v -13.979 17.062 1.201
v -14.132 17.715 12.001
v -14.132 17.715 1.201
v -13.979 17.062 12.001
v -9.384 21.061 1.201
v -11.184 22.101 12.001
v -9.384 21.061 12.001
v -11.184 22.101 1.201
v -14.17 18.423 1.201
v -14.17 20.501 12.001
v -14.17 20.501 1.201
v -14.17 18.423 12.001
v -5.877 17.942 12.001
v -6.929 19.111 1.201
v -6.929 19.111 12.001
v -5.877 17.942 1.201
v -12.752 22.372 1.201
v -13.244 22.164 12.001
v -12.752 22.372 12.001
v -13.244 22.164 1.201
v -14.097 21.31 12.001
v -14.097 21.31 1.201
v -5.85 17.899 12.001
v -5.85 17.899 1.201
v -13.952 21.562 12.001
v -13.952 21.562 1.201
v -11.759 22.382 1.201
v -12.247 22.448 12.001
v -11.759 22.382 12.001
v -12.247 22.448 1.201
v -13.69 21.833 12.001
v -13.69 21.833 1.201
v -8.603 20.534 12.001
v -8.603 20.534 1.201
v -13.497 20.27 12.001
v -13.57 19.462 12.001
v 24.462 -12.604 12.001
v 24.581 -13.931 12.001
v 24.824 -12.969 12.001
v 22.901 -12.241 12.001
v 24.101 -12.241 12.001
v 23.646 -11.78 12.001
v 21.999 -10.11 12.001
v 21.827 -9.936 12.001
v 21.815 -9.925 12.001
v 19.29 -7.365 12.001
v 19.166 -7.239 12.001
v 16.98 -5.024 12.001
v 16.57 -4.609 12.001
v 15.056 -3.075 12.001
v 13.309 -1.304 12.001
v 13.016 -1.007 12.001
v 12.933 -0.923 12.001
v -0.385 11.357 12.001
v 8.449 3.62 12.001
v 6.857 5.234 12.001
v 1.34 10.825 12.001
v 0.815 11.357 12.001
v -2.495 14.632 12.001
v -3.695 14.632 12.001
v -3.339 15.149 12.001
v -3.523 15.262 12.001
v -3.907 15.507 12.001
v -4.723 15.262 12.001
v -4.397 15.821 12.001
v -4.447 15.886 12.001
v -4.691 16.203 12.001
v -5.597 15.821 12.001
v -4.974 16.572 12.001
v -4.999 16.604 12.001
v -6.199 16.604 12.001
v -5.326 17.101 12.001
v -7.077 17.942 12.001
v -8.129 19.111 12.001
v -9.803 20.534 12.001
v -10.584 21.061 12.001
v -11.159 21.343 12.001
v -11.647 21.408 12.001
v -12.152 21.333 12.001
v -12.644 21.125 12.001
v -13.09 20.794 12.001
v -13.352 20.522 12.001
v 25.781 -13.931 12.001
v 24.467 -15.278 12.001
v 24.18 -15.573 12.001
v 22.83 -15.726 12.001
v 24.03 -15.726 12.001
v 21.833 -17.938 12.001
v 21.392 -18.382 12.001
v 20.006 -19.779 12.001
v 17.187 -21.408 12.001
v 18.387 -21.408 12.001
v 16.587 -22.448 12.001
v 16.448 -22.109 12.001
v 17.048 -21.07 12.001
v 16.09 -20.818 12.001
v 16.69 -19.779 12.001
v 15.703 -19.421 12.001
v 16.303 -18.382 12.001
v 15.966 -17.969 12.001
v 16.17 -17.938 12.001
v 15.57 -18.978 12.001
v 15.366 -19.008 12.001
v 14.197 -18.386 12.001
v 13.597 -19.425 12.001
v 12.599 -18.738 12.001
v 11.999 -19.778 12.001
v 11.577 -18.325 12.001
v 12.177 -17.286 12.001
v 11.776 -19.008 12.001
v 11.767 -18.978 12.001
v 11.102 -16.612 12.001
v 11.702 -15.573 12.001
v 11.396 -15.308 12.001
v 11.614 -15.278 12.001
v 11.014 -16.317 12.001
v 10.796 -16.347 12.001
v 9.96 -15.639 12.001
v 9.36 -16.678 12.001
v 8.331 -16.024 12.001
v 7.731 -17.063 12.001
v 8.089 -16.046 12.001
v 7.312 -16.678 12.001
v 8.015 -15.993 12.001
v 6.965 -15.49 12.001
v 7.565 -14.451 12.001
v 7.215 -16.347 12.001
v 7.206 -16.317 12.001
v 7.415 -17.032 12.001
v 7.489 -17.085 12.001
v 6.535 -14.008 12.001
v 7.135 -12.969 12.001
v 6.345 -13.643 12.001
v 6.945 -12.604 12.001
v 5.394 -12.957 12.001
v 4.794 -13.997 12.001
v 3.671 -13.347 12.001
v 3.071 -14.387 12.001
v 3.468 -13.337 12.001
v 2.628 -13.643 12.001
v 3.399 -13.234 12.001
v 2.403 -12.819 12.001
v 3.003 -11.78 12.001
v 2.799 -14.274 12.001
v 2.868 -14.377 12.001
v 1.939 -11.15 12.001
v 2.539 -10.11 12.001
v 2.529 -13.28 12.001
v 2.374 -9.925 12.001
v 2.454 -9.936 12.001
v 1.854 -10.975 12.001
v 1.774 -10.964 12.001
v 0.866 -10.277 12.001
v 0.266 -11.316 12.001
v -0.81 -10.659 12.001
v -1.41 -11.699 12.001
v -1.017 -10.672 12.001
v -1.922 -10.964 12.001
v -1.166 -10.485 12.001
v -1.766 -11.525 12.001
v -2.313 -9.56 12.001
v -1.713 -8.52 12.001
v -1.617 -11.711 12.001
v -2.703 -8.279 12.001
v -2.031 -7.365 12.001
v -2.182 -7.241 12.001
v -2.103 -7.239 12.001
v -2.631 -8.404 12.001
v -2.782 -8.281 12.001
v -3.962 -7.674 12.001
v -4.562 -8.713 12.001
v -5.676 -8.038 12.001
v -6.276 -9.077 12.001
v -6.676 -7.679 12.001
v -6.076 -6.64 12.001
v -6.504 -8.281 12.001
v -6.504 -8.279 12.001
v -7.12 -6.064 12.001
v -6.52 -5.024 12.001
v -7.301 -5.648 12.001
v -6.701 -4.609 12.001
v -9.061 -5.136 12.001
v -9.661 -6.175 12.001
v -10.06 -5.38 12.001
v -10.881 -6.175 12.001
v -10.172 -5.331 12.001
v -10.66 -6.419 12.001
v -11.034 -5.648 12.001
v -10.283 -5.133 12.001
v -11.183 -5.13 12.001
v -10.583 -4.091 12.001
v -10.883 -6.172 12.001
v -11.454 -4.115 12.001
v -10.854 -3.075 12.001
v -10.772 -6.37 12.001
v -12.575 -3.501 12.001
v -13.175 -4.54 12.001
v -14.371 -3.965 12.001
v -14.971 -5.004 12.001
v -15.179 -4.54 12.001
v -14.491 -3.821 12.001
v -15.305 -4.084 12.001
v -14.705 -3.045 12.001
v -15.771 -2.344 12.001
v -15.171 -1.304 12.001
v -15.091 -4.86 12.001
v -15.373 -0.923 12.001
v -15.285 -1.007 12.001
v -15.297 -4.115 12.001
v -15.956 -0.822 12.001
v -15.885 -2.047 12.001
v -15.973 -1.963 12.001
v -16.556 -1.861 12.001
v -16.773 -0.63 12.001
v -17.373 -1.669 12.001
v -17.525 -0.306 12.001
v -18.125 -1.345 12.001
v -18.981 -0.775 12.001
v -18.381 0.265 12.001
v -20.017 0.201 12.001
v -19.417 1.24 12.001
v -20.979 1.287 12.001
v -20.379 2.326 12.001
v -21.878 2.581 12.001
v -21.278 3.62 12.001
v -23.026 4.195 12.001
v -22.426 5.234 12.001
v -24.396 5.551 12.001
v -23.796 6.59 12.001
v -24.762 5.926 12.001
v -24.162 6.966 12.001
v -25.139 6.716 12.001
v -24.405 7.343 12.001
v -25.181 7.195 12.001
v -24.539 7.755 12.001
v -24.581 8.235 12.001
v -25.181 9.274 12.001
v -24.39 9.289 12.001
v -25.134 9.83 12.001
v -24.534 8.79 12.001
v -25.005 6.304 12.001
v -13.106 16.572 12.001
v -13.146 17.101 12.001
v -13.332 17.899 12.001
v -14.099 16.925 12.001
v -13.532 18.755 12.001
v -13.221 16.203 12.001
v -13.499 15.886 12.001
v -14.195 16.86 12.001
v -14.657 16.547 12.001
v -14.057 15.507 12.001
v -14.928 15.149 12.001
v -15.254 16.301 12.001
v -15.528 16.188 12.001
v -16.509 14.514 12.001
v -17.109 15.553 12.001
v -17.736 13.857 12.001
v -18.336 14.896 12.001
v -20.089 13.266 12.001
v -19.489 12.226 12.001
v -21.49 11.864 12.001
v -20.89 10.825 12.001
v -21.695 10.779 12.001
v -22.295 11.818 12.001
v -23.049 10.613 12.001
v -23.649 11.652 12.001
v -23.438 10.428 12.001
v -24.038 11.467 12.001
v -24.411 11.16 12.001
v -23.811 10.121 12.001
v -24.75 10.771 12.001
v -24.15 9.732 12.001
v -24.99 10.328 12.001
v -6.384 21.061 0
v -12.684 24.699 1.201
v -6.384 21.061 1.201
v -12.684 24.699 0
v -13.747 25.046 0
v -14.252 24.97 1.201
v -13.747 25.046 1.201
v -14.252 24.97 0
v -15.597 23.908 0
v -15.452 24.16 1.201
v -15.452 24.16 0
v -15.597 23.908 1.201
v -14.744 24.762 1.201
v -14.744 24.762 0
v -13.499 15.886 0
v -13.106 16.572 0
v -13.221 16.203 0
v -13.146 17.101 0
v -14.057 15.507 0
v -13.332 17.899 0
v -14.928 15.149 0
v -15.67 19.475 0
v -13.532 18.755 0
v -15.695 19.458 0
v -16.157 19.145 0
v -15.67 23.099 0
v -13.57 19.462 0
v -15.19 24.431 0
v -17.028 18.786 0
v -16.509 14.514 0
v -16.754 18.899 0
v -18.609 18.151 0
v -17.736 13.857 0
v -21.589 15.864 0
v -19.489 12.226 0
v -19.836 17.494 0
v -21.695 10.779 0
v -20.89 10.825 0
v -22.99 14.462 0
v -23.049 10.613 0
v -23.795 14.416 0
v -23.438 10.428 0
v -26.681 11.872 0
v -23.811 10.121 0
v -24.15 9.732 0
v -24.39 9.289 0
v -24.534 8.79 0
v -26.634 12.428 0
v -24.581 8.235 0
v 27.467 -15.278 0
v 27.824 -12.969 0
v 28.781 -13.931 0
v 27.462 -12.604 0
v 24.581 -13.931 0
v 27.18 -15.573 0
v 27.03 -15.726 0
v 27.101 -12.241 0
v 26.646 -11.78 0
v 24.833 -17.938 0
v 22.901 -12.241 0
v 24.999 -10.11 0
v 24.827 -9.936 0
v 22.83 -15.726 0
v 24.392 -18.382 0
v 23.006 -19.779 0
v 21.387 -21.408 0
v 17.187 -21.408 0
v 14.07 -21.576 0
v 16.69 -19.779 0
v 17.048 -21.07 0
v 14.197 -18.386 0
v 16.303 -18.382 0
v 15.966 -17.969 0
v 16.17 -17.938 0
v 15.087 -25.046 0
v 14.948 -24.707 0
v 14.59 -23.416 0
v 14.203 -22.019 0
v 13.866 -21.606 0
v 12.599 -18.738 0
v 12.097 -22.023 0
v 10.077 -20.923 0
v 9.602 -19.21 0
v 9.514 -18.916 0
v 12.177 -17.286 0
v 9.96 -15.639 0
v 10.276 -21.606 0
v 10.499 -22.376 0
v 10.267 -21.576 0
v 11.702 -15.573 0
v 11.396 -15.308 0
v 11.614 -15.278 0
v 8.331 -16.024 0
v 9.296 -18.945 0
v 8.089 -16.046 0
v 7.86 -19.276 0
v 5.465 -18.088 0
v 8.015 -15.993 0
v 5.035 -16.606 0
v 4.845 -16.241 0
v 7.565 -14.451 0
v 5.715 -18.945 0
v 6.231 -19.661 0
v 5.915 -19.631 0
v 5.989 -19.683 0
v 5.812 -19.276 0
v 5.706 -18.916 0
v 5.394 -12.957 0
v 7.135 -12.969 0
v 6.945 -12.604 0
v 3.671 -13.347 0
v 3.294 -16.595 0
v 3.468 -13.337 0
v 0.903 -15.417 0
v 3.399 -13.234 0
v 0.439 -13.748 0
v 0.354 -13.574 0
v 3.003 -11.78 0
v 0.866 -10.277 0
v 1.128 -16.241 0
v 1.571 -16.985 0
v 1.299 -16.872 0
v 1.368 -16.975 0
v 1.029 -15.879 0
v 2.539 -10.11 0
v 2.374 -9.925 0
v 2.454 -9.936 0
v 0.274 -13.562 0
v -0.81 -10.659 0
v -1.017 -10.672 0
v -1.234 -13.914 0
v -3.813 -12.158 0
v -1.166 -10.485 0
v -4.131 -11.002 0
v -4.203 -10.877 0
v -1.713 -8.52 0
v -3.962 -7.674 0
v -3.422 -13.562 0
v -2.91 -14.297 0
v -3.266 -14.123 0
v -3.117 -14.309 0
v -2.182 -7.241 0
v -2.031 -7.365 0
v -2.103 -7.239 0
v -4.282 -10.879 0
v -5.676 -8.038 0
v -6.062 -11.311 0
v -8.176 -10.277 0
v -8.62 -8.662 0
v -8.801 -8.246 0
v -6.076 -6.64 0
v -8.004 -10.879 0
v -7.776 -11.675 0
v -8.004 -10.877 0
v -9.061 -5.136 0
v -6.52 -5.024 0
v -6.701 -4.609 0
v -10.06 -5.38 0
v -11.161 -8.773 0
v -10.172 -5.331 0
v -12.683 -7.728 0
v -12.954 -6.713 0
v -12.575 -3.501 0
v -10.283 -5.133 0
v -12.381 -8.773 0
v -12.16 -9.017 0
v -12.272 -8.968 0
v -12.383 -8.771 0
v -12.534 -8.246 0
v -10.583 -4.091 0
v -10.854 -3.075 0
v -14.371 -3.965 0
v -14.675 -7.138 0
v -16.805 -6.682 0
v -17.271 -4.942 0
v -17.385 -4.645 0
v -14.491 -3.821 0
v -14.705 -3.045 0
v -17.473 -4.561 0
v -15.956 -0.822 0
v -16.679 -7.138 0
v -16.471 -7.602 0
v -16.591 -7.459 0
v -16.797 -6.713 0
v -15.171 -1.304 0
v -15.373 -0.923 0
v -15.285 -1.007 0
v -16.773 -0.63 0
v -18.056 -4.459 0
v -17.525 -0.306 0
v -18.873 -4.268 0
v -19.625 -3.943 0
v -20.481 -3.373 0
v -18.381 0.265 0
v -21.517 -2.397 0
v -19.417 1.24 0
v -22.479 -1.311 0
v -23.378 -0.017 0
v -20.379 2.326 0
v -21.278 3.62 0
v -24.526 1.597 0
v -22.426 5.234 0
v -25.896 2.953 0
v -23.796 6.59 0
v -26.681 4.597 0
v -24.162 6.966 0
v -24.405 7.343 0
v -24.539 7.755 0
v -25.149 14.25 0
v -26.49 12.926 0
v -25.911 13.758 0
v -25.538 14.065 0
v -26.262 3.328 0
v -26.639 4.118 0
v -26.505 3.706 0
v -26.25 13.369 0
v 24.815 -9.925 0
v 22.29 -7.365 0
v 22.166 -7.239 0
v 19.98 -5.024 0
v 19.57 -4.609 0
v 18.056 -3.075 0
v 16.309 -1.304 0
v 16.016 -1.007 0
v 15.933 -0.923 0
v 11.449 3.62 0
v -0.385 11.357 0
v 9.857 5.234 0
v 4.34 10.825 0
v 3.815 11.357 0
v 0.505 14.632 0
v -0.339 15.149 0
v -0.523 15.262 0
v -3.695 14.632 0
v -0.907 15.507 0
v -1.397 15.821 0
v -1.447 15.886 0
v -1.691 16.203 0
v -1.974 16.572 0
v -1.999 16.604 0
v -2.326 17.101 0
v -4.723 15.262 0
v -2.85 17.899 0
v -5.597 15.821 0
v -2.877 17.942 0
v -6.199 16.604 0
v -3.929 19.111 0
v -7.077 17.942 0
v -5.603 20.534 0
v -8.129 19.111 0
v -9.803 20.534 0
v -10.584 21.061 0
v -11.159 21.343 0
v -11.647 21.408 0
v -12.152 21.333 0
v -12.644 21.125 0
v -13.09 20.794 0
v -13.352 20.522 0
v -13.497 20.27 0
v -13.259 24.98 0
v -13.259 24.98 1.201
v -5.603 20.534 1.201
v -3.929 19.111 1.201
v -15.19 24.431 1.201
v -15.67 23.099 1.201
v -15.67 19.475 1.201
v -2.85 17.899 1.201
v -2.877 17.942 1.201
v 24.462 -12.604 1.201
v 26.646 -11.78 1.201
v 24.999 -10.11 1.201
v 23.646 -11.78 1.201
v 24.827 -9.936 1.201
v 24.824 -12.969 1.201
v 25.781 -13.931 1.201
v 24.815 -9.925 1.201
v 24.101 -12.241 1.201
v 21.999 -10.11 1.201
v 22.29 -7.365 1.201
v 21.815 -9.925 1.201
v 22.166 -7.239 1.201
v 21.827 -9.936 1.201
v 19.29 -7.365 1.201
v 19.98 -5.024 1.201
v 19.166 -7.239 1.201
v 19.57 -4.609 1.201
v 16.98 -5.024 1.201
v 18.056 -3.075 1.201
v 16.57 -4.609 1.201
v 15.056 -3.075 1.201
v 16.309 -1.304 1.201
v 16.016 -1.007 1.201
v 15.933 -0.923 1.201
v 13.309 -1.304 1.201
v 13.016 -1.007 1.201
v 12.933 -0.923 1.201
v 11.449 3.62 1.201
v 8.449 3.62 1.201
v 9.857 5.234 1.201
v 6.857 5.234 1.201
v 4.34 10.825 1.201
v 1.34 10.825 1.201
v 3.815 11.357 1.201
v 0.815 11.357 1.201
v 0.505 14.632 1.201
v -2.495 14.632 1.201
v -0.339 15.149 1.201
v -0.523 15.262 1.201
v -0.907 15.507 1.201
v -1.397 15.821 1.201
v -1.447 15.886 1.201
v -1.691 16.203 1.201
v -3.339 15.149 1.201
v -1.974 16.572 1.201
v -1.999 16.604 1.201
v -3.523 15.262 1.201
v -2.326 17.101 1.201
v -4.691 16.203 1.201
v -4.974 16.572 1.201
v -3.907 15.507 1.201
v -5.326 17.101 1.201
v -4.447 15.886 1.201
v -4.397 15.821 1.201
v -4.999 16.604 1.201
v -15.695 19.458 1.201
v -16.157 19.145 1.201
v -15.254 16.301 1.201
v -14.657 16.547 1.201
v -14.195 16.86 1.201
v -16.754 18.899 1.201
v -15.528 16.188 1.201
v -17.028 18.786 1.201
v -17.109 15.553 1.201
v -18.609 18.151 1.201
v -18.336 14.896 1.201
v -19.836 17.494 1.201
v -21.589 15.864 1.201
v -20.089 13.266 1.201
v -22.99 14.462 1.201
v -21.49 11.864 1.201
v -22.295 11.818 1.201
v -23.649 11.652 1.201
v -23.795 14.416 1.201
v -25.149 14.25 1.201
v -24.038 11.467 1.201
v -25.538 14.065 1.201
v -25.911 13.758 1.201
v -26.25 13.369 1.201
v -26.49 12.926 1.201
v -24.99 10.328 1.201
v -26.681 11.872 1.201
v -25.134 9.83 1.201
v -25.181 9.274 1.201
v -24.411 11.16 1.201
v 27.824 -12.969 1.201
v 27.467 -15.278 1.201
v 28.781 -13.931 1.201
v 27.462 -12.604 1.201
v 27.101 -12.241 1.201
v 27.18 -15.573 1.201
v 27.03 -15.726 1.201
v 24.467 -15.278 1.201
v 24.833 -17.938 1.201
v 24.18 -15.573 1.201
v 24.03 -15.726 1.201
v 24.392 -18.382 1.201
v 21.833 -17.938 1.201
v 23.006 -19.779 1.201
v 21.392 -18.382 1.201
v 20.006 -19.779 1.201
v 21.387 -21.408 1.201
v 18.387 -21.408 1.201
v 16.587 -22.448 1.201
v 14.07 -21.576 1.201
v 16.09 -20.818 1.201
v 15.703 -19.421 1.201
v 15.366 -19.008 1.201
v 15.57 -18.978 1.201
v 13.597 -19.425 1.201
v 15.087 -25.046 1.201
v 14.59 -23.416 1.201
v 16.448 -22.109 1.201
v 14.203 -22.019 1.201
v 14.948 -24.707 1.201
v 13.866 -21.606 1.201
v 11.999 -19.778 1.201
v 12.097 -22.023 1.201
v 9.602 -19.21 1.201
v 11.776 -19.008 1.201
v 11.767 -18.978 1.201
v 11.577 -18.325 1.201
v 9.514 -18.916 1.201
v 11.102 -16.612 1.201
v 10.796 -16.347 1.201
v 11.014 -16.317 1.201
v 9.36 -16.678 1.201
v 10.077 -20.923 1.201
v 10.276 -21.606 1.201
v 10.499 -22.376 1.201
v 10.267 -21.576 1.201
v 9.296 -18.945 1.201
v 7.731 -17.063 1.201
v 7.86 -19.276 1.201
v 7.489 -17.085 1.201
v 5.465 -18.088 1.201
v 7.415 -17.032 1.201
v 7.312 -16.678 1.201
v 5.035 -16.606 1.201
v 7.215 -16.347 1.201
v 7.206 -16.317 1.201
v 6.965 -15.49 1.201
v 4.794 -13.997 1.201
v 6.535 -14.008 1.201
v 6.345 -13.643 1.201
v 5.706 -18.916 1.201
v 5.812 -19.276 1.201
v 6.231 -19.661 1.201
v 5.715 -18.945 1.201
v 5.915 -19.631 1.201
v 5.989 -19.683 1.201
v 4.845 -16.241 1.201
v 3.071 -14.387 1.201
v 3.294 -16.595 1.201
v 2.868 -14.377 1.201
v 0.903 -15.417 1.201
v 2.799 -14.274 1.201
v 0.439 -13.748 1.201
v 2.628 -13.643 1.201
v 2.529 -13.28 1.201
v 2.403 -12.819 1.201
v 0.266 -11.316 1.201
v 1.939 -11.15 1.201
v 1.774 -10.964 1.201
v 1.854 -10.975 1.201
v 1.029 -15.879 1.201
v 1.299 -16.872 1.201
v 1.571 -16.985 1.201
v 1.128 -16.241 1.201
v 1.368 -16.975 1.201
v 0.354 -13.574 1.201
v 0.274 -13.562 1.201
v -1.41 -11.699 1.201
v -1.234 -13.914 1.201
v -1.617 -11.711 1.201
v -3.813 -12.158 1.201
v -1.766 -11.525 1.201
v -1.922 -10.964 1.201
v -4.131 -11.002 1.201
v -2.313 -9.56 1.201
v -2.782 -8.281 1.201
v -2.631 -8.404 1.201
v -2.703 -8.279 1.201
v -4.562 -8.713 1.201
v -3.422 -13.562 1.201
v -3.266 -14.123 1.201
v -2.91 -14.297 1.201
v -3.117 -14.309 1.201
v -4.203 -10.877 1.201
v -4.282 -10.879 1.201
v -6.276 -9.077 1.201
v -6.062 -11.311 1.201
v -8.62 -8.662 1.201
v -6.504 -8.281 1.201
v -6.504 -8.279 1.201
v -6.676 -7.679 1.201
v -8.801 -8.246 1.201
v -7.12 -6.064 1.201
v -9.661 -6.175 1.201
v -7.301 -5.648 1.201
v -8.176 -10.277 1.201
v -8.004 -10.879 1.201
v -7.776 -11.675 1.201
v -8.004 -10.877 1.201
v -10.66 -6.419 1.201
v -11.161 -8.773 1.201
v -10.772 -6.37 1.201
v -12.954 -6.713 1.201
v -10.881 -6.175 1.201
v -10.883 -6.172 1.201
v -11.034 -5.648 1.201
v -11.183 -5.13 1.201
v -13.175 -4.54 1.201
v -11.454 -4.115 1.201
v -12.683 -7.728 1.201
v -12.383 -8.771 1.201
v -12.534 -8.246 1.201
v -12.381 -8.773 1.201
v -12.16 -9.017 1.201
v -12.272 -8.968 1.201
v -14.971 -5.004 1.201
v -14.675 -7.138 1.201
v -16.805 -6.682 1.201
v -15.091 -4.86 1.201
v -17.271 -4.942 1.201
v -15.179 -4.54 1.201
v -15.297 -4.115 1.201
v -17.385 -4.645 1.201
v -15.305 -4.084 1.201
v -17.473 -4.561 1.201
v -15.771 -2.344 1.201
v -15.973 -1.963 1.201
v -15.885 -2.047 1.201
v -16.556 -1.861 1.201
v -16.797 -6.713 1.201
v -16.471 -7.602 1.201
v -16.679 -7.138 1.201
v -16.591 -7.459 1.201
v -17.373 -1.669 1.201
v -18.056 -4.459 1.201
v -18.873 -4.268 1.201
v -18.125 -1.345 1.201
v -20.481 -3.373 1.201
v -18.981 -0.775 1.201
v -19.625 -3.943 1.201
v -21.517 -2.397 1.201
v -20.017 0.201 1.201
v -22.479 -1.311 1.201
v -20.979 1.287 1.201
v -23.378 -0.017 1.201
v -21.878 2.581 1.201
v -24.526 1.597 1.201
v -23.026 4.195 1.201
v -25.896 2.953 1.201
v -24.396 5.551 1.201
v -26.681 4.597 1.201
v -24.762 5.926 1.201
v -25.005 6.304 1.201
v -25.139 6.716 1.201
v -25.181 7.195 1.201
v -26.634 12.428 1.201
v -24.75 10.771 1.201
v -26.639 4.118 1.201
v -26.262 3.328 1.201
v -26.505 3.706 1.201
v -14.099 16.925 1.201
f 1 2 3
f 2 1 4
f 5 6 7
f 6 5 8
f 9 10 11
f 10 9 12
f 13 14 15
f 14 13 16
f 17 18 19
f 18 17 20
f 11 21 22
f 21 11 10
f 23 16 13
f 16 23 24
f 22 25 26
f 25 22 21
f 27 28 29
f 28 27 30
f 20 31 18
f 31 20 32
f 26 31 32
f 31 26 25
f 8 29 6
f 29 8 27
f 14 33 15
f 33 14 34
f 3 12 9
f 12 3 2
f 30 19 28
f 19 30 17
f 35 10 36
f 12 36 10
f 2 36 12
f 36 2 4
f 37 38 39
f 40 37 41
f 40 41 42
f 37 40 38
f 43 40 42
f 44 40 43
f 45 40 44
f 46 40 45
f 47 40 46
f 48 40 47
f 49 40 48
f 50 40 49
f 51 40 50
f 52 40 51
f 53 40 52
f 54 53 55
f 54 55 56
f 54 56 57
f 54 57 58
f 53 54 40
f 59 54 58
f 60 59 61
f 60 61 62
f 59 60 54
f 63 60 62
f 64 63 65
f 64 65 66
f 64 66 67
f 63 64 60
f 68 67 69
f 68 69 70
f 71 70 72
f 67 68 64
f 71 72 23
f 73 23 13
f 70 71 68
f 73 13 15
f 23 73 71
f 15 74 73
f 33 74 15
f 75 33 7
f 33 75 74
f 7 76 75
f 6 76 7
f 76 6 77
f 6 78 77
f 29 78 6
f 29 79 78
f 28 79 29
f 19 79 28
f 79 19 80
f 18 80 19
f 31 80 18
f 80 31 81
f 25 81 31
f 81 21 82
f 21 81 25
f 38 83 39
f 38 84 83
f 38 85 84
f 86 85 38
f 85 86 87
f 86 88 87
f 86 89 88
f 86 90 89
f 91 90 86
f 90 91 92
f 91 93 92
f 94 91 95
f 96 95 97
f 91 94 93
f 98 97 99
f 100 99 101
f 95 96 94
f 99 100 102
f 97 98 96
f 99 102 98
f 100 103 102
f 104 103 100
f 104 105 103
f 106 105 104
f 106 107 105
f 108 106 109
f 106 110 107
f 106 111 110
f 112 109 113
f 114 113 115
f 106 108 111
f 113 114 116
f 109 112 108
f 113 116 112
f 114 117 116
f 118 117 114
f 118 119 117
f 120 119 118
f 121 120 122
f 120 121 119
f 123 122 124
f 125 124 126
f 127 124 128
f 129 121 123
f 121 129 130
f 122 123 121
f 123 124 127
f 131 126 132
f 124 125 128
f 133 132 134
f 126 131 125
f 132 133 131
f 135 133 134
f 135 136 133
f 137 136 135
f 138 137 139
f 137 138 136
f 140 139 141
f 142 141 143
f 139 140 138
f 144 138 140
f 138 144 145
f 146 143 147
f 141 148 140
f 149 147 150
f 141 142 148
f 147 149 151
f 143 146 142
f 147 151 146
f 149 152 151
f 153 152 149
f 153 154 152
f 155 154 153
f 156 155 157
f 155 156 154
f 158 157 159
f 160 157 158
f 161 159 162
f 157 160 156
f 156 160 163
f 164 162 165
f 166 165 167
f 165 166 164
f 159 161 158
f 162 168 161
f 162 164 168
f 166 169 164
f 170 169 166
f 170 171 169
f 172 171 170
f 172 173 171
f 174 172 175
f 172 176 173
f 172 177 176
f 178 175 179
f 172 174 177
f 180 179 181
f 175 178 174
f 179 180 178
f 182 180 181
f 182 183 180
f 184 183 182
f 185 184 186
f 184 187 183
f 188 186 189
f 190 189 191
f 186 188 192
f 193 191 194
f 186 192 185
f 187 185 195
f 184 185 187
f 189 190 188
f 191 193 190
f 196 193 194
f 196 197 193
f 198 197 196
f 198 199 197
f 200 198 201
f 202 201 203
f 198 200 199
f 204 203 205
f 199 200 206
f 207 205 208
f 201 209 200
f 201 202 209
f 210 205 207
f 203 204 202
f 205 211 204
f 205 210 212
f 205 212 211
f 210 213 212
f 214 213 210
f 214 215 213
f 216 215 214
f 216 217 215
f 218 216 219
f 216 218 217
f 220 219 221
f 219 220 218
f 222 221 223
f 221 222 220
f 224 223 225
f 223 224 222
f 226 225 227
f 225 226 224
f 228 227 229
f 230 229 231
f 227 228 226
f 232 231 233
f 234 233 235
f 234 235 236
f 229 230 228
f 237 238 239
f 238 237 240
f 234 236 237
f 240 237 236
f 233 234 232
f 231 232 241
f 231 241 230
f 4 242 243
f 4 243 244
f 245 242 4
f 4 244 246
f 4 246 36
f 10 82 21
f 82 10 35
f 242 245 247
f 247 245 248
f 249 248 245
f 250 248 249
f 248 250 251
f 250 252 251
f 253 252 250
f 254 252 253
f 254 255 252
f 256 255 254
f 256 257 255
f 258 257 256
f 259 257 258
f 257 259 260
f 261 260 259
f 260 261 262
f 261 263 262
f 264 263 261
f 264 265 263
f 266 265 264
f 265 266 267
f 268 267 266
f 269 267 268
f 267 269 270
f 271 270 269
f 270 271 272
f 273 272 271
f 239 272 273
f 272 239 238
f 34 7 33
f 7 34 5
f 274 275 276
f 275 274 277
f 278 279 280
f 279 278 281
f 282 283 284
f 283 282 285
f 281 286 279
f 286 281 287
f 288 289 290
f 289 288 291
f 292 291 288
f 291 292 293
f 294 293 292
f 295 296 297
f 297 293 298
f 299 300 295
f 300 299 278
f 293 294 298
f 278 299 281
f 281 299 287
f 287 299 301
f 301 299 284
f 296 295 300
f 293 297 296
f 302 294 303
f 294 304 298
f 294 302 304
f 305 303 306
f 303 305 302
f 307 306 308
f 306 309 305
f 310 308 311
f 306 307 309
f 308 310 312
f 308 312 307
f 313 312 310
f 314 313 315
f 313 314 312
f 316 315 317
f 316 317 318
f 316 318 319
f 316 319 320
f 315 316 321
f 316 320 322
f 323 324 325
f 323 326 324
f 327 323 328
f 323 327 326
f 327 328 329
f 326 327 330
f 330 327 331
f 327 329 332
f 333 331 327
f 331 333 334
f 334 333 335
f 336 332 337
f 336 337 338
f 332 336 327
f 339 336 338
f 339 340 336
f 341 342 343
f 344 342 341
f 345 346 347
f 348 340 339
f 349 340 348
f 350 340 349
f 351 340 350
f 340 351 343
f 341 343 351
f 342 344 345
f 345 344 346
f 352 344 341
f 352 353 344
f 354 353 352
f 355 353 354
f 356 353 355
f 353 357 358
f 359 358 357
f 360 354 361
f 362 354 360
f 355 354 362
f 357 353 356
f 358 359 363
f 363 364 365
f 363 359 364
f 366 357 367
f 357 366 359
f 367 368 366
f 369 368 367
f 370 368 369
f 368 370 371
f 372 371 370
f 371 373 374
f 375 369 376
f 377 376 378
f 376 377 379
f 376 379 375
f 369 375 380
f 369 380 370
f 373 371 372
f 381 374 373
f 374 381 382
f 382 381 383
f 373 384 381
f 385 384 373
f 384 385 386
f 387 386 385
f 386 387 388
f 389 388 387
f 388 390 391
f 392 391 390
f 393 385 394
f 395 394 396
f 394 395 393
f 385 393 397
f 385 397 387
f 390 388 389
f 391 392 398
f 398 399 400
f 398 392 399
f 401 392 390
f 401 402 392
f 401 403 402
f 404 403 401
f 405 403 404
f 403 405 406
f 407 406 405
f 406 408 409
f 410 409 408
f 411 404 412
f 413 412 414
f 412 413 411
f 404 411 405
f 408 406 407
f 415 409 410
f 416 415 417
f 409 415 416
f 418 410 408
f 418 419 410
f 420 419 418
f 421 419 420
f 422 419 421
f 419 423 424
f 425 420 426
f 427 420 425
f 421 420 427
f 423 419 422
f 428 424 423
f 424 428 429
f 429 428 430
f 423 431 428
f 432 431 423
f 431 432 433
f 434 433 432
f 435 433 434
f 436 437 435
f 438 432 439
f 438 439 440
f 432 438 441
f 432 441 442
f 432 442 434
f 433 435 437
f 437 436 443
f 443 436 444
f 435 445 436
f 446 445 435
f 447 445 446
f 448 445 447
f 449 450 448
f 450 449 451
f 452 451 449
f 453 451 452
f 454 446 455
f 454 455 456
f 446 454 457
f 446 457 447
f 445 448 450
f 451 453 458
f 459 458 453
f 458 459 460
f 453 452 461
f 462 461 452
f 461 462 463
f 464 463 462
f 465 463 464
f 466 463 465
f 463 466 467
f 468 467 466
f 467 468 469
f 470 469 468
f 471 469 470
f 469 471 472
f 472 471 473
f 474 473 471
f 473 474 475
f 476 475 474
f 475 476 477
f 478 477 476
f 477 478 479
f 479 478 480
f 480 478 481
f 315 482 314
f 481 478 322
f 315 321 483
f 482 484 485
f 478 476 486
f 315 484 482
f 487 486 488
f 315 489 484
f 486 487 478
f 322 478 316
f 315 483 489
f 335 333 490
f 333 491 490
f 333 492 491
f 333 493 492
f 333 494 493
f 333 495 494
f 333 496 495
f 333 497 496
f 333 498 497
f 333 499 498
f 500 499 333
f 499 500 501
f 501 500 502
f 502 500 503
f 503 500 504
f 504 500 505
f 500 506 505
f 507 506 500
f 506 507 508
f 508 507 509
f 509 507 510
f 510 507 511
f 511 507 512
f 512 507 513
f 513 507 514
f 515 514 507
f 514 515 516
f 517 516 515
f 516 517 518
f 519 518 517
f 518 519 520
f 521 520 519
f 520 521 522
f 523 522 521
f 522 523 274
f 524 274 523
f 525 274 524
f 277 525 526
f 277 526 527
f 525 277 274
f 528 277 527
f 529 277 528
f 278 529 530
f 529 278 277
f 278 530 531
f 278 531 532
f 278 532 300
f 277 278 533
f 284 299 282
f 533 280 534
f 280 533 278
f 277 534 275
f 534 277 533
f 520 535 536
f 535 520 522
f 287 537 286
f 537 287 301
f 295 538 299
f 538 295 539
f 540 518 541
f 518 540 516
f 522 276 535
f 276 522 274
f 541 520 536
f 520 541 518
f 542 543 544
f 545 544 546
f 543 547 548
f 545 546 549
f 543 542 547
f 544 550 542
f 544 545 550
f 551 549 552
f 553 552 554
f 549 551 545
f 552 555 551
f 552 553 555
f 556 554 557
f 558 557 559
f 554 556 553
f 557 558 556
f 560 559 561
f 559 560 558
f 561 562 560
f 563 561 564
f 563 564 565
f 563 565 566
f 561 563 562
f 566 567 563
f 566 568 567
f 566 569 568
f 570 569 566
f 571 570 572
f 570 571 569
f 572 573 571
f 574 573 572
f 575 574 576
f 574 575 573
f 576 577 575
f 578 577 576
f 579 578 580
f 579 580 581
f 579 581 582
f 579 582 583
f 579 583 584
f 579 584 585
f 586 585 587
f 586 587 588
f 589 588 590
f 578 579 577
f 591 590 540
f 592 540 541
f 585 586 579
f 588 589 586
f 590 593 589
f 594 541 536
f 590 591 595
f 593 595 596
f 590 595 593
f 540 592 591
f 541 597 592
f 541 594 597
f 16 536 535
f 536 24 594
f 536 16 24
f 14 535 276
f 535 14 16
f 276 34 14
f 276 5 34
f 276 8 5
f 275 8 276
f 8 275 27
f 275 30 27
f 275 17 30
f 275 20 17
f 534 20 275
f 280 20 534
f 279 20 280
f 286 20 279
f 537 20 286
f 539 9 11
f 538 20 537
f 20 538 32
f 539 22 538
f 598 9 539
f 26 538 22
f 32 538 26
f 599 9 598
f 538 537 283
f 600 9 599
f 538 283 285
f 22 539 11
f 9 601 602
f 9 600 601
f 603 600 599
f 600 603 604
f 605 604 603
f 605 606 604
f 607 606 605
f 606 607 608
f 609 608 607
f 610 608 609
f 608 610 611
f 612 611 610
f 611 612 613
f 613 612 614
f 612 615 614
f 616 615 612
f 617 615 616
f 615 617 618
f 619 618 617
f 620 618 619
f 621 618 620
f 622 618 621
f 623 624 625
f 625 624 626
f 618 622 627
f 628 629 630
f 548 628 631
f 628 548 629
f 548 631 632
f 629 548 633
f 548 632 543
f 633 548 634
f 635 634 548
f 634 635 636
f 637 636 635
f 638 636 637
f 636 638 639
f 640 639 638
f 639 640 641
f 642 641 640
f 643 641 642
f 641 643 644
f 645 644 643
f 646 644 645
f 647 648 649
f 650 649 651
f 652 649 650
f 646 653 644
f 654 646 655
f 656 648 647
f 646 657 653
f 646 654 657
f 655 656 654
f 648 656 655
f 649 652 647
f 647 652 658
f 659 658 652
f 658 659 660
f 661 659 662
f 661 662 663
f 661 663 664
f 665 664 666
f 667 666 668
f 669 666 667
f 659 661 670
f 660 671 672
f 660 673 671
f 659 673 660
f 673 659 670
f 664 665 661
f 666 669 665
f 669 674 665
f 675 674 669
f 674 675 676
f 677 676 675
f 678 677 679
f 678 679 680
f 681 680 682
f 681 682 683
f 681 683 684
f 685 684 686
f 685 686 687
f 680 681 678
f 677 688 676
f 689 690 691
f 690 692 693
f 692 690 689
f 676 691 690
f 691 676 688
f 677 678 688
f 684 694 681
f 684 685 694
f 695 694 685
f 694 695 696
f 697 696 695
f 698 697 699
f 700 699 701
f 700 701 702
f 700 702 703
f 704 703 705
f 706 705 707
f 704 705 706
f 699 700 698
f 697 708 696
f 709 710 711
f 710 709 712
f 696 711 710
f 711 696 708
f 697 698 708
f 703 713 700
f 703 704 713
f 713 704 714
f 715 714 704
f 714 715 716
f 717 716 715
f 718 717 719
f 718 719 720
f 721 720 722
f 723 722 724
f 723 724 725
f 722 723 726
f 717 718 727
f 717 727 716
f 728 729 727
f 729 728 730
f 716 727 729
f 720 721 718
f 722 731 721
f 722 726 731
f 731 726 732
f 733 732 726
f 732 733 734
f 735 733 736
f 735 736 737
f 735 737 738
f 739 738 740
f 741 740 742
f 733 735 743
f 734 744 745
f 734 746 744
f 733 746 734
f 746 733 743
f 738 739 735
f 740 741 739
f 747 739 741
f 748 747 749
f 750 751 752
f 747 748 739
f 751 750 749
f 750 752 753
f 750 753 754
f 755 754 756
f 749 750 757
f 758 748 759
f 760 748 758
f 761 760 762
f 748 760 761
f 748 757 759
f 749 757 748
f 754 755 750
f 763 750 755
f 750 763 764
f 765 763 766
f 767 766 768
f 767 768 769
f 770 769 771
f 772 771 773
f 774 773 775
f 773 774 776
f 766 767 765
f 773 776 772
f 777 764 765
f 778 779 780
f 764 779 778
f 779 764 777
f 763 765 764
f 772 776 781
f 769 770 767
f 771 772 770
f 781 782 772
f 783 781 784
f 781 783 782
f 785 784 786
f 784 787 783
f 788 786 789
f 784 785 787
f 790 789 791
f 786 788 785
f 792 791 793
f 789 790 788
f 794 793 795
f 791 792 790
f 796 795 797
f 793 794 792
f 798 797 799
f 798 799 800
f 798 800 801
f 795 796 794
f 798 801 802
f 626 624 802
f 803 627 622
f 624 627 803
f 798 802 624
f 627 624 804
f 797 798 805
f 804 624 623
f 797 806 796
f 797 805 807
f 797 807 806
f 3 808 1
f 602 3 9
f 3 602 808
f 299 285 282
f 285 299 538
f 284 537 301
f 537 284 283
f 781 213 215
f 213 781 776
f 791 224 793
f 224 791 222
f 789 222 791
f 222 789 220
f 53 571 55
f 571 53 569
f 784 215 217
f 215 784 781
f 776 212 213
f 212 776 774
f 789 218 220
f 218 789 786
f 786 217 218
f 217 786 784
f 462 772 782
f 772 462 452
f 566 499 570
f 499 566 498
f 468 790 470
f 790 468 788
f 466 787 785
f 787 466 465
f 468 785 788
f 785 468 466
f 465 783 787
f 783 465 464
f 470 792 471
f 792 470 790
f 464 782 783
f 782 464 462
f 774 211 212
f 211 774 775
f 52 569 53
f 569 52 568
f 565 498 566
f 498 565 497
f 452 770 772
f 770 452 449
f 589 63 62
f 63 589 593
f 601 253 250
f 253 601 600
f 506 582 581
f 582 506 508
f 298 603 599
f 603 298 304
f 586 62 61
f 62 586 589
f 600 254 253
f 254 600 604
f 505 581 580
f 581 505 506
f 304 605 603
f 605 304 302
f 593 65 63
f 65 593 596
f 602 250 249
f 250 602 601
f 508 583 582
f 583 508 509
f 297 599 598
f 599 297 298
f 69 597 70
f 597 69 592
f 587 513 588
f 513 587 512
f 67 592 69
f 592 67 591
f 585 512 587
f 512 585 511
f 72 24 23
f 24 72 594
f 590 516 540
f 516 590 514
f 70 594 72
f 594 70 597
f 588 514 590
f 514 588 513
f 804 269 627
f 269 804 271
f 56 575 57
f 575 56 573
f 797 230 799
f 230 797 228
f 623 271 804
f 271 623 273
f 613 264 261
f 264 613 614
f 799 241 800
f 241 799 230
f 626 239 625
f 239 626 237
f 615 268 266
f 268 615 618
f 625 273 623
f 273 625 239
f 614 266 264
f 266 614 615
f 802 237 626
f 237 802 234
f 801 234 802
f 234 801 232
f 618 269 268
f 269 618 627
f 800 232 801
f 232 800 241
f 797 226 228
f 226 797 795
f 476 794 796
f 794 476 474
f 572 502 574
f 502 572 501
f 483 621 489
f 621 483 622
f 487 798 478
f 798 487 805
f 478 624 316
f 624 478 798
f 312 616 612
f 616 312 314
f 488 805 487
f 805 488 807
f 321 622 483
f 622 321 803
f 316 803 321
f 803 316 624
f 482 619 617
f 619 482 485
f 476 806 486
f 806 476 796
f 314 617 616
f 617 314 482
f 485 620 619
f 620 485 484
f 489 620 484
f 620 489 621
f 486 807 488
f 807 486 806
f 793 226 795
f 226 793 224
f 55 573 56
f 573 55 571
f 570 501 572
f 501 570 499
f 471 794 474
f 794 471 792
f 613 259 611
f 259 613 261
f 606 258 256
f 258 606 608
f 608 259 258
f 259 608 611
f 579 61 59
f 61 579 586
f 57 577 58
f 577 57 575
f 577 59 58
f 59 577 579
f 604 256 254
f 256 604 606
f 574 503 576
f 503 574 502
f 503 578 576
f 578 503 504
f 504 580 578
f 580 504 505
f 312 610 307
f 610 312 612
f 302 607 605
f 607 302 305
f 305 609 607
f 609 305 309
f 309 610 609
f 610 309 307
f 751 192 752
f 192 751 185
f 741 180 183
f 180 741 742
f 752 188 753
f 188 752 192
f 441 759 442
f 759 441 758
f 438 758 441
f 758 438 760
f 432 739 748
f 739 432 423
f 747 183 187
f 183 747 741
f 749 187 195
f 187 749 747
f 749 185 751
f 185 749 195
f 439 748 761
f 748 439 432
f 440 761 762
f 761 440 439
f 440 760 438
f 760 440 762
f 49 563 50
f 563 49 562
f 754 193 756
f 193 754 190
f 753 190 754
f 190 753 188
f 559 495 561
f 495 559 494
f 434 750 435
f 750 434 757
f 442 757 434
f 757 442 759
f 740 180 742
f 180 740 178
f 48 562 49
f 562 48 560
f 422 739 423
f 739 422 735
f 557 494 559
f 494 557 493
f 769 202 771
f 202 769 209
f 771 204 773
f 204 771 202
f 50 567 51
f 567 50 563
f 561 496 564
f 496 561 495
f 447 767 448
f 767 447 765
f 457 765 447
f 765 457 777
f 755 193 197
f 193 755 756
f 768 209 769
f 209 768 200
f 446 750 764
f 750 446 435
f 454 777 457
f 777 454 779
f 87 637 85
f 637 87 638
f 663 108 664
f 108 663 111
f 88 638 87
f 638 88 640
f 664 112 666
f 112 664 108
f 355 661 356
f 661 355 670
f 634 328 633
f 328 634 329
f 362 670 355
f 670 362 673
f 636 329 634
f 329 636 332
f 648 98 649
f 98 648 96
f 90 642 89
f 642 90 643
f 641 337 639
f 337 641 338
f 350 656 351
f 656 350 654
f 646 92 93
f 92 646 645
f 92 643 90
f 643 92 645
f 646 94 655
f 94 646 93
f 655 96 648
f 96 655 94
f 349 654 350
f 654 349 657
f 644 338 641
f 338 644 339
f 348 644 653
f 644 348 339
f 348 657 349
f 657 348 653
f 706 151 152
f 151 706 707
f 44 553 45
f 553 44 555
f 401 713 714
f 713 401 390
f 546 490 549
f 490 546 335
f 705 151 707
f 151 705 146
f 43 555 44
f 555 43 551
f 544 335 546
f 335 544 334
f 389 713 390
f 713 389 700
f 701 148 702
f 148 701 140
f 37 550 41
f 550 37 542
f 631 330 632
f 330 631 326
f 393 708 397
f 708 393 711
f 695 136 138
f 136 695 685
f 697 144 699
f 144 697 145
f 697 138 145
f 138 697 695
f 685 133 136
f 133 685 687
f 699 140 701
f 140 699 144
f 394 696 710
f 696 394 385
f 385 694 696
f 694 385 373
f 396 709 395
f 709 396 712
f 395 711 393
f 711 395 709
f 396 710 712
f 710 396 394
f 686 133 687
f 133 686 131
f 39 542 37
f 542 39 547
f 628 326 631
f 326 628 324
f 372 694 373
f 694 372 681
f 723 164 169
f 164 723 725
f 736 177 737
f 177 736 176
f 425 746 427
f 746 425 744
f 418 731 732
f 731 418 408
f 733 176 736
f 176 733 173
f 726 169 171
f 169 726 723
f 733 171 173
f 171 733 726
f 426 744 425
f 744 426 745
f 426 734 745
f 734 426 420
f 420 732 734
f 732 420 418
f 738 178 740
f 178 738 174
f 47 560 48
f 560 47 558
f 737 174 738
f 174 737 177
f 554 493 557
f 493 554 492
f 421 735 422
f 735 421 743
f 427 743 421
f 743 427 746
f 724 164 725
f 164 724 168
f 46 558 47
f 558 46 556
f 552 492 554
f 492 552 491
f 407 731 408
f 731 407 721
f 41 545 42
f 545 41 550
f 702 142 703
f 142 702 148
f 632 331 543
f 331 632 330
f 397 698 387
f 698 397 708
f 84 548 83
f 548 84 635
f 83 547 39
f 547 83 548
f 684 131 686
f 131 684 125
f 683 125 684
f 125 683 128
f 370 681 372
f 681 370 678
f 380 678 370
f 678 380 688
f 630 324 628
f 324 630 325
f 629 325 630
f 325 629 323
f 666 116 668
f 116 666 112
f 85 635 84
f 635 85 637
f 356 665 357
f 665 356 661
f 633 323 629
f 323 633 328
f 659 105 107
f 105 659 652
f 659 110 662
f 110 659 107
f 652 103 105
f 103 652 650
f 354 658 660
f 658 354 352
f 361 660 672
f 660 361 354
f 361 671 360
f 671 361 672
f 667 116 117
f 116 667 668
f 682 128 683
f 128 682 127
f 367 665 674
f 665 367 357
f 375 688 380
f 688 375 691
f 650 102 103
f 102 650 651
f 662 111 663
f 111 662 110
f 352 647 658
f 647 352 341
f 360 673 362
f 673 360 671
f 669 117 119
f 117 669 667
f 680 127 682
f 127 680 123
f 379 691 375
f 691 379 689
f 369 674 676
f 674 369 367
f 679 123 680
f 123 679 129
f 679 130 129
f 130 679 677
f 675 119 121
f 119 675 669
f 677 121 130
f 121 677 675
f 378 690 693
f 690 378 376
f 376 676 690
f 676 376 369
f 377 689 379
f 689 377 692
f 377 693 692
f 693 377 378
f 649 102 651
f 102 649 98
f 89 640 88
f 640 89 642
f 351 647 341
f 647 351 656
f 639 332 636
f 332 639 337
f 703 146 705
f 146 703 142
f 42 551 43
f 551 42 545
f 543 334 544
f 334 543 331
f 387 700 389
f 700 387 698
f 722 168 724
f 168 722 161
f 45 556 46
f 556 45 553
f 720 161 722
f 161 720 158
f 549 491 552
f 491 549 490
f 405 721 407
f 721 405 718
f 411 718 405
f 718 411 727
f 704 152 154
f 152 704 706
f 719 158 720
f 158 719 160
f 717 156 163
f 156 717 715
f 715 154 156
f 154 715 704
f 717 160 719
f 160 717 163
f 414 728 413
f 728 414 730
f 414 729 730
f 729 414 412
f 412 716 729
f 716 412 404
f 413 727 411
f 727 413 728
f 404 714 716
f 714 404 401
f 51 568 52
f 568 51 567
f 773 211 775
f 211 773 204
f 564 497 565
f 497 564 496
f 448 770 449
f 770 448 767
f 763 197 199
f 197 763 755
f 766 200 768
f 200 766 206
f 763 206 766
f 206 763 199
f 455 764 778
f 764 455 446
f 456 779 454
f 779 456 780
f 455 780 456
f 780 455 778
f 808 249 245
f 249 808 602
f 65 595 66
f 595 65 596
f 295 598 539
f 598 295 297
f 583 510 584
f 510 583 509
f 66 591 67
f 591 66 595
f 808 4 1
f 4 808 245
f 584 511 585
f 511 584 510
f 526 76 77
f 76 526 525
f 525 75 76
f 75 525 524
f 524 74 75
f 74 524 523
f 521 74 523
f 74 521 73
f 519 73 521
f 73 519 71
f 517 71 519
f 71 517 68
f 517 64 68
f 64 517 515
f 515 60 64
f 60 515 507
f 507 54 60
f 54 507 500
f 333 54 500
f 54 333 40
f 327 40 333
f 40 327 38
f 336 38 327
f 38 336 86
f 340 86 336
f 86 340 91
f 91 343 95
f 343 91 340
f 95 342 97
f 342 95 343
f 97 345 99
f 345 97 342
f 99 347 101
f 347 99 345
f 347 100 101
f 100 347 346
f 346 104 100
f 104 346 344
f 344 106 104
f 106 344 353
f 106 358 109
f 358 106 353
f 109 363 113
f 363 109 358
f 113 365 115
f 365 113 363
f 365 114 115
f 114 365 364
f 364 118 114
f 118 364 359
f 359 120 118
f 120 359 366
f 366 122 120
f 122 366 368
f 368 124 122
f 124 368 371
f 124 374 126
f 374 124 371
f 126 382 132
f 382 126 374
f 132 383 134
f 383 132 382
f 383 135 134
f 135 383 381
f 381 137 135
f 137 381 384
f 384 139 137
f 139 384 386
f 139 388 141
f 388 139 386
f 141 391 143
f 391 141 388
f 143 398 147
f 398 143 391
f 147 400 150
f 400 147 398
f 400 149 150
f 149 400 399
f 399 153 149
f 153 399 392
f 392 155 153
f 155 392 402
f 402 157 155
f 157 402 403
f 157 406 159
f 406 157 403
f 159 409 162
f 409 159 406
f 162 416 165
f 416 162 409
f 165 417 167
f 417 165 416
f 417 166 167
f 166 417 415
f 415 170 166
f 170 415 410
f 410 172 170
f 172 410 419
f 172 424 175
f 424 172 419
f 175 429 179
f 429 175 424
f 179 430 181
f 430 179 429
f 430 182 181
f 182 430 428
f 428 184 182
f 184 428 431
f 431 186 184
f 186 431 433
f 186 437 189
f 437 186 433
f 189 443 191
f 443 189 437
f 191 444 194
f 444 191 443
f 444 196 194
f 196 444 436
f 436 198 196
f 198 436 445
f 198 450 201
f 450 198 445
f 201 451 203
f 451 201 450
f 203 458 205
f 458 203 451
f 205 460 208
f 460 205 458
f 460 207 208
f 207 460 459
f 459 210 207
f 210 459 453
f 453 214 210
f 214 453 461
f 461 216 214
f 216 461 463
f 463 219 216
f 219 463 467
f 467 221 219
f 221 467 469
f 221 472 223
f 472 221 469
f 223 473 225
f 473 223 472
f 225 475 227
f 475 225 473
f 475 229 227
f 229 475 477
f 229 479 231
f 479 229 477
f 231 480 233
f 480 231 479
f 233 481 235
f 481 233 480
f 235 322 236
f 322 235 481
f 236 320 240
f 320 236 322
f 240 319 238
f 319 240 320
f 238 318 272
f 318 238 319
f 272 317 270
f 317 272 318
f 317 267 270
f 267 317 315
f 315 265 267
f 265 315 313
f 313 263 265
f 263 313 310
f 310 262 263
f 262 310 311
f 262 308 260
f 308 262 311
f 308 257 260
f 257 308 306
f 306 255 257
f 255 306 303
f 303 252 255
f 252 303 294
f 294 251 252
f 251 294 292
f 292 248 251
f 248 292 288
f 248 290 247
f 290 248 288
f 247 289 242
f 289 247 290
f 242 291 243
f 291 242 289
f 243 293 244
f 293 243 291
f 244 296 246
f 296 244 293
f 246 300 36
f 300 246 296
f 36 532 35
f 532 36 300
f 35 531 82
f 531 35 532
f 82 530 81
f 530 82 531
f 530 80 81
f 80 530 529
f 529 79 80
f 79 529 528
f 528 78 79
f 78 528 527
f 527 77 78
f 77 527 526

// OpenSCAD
// Module names are of the form poly_<inkscape-path-id>().  As a result,
// you can associate a polygon in this OpenSCAD program with the corresponding
// SVG element in the Inkscape document by looking for the XML element with
// the attribute id="inkscape-path-id".

// fudge value is used to ensure that subtracted solids are a tad taller
// in the z dimension than the polygon being subtracted from.  This helps
// keep the resulting .stl file manifold.
fudge = 0.1;

			
			    /// Global parameters
grid = false ;   //Use grid for multi elements cutters
full= false ;  //For build full or empty objects (see instuctables for details)
borderThick = 1.20000004768  ;    //border thickness (mm)
h=   12.0  ;    //total height of the cookie cutter (mm)
borderType=  1   ;    //type of border, 0 none, 1-classic, 2-cone
Lreb = 3.0;     //Width of border (en mm)
Hreb = 1.20000004768 ;    //Thickness of border (mm)




                /// Grid parameters
gridX=300;      //Maximum X dimension Change only if you build cookies bigger than 30cm
gridY=300;      //Maximum Y dimension Change only if you build cookies bigger than 30cm
meshSolid=1.20000004768;    //width of solid part of grid
meshSpace=8.0;    //width of blank part of grid 
gridThickness=Hreb; //thickness of grid
moveGridX=0;    //X shift for adujustments
moveGridY=0;    //Y shift for adjustments
rotateGridZ=45.0;  //Z rotation for adjtments
$fn = 0.1;



module poly_path172(h)
{
  scale([25.4/90, -25.4/90, 1]) union()
  {
    linear_extrude(height=h)
      polygon([[60.407721,74.657168],[59.139561,70.081678],[57.765511,65.133328],[57.295591,63.561078],[56.573141,63.669988],[50.305531,65.146208],[44.642671,66.395828],[43.148421,61.250038],[41.462732,55.178668],[41.153591,54.135388],[40.380061,54.241408],[35.290382,55.414018],[29.520545,56.776828],[28.661447,56.855256],[28.399231,56.668948],[26.805301,51.204038],[25.281140,45.952056],[24.609421,44.659848],[19.114011,45.911998],[13.007591,47.293668],[12.286869,47.258843],[12.044781,46.893268],[10.641861,41.740288],[8.995434,35.823836],[8.696067,35.207110],[8.411591,35.165798],[3.068581,36.414948],[-2.869745,37.769718],[-3.603739,37.813011],[-4.133076,37.153153],[-6.069555,30.190508],[-7.194732,26.096932],[-7.451932,25.651630],[-7.731295,25.658248],[-14.039279,27.190288],[-20.112964,28.479788],[-21.528077,23.527168],[-23.101191,17.803218],[-23.744516,16.331498],[-32.105345,18.198318],[-35.645268,19.062088],[-36.041638,18.887897],[-36.434084,18.188738],[-37.499641,14.495298],[-38.457464,10.896708],[-44.558765,12.404028],[-50.921996,14.048038],[-51.344832,13.539905],[-52.105399,10.789998],[-53.754338,4.622181],[-54.158391,3.569183],[-54.470473,3.271508],[-56.537578,2.910968],[-59.433213,2.233142],[-62.095300,1.083348],[-65.128738,-0.937333],[-68.801259,-4.393582],[-72.208963,-8.241574],[-75.393824,-12.827822],[-79.463523,-18.546040],[-84.315973,-23.350842],[-85.613833,-24.681516],[-86.473126,-26.018745],[-86.949342,-27.478755],[-87.097971,-29.177772],[-86.931493,-31.146903],[-86.422799,-32.913070],[-85.569253,-34.482758],[-84.368221,-35.862452],[-83.049004,-36.949127],[-81.669920,-37.603503],[-76.872602,-38.193702],[-74.019215,-38.354892],[-69.054288,-43.322022],[-62.845537,-49.097912],[-58.495942,-51.426277],[-52.894953,-53.677993],[-49.809612,-54.947373],[-47.832074,-56.287793],[-46.844757,-57.410928],[-46.437945,-58.719235],[-46.579776,-60.595648],[-47.238389,-63.423103],[-47.948633,-66.453235],[-48.082411,-68.959943],[-47.824865,-71.823933],[-47.309868,-72.717150],[-46.383316,-73.679113],[-44.801351,-74.851477],[-43.058668,-75.587971],[-41.267851,-75.856568],[-39.541483,-75.625243],[-37.501701,-74.627051],[-34.736631,-72.758489],[-28.803551,-67.716113],[-25.077316,-63.572279],[-21.964439,-58.831663],[-19.832039,-56.057941],[-16.735248,-54.077413],[-13.092624,-51.846423],[-1.365158,-40.241472],[81.146512,43.374408],[87.097972,49.361908],[80.892832,55.723788],[60.898732,75.856568],[60.407722,74.657168]]);
  }
}


module shape(h){ poly_path172(h);

}

//-------------------------------------------------

/// Module grid have been imported from the Openscad grid creator by Glyn
/// Orininaly published on http://www.thingiverse.com/thing:29211
/// Under the terms of Creative Commons By-Sa (08.26.2012)

module grid(meshSolid, meshSpace, gridThickness, gridX, gridY){

meshX=gridX;
meshY=gridY;
nX=meshX/(meshSolid+meshSpace);
nY=meshY/(meshSolid+meshSpace);

for (i=[0:nX]) {
	 	 translate([-(meshX/2)+i*(meshSolid+meshSpace),-meshY/2,-gridThickness/2]) cube(size=[meshSolid,meshY,gridThickness],center=false);
}

for (i=[0:nY]) {
	 	translate([-meshX/2,-(meshY/2)+i*(meshSolid+meshSpace),-gridThickness/2]) cube(size=[meshX,meshSolid,gridThickness],center=false);
    }
}


module rebords(borderType,borderThick,Lreb,Hreb){
if (borderType==0){}
if (borderType==1){
    cylinder(h = Hreb, r=(borderThick+Lreb));} 
if (borderType==2) {
    cylinder(h = Hreb, r1=(borderThick+Lreb),r2=(borderThick));}
}


module borders(h){
cylinder(r=borderThick,h=h);
}



module fullVolume (borderType,borderThick,Lreb,Hreb,h) {
minkowski(){
    shape(0.001);
    union(){
       borders(h);
       rebords(borderType,borderThick,Lreb,Hreb);
    }}}


module finalShape(){
if (full == false){
    difference(){
      fullVolume(borderType,borderThick,Lreb,Hreb,h);
      translate([0,0,(-0.5*h)]) shape(3*h);
}}
else{
          fullVolume(borderType,borderThick,Lreb,Hreb,h);
}
}


if (grid==true){
union (){
  finalShape();
  intersection() {
   translate([moveGridX,moveGridY,(0.5*gridThickness)]) rotate([0,0,rotateGridZ]) grid(meshSolid, meshSpace, gridThickness, gridX, gridY);
    shape();
}}
}
else{
    finalShape();
}

// Enjoy your cookies ! :)
